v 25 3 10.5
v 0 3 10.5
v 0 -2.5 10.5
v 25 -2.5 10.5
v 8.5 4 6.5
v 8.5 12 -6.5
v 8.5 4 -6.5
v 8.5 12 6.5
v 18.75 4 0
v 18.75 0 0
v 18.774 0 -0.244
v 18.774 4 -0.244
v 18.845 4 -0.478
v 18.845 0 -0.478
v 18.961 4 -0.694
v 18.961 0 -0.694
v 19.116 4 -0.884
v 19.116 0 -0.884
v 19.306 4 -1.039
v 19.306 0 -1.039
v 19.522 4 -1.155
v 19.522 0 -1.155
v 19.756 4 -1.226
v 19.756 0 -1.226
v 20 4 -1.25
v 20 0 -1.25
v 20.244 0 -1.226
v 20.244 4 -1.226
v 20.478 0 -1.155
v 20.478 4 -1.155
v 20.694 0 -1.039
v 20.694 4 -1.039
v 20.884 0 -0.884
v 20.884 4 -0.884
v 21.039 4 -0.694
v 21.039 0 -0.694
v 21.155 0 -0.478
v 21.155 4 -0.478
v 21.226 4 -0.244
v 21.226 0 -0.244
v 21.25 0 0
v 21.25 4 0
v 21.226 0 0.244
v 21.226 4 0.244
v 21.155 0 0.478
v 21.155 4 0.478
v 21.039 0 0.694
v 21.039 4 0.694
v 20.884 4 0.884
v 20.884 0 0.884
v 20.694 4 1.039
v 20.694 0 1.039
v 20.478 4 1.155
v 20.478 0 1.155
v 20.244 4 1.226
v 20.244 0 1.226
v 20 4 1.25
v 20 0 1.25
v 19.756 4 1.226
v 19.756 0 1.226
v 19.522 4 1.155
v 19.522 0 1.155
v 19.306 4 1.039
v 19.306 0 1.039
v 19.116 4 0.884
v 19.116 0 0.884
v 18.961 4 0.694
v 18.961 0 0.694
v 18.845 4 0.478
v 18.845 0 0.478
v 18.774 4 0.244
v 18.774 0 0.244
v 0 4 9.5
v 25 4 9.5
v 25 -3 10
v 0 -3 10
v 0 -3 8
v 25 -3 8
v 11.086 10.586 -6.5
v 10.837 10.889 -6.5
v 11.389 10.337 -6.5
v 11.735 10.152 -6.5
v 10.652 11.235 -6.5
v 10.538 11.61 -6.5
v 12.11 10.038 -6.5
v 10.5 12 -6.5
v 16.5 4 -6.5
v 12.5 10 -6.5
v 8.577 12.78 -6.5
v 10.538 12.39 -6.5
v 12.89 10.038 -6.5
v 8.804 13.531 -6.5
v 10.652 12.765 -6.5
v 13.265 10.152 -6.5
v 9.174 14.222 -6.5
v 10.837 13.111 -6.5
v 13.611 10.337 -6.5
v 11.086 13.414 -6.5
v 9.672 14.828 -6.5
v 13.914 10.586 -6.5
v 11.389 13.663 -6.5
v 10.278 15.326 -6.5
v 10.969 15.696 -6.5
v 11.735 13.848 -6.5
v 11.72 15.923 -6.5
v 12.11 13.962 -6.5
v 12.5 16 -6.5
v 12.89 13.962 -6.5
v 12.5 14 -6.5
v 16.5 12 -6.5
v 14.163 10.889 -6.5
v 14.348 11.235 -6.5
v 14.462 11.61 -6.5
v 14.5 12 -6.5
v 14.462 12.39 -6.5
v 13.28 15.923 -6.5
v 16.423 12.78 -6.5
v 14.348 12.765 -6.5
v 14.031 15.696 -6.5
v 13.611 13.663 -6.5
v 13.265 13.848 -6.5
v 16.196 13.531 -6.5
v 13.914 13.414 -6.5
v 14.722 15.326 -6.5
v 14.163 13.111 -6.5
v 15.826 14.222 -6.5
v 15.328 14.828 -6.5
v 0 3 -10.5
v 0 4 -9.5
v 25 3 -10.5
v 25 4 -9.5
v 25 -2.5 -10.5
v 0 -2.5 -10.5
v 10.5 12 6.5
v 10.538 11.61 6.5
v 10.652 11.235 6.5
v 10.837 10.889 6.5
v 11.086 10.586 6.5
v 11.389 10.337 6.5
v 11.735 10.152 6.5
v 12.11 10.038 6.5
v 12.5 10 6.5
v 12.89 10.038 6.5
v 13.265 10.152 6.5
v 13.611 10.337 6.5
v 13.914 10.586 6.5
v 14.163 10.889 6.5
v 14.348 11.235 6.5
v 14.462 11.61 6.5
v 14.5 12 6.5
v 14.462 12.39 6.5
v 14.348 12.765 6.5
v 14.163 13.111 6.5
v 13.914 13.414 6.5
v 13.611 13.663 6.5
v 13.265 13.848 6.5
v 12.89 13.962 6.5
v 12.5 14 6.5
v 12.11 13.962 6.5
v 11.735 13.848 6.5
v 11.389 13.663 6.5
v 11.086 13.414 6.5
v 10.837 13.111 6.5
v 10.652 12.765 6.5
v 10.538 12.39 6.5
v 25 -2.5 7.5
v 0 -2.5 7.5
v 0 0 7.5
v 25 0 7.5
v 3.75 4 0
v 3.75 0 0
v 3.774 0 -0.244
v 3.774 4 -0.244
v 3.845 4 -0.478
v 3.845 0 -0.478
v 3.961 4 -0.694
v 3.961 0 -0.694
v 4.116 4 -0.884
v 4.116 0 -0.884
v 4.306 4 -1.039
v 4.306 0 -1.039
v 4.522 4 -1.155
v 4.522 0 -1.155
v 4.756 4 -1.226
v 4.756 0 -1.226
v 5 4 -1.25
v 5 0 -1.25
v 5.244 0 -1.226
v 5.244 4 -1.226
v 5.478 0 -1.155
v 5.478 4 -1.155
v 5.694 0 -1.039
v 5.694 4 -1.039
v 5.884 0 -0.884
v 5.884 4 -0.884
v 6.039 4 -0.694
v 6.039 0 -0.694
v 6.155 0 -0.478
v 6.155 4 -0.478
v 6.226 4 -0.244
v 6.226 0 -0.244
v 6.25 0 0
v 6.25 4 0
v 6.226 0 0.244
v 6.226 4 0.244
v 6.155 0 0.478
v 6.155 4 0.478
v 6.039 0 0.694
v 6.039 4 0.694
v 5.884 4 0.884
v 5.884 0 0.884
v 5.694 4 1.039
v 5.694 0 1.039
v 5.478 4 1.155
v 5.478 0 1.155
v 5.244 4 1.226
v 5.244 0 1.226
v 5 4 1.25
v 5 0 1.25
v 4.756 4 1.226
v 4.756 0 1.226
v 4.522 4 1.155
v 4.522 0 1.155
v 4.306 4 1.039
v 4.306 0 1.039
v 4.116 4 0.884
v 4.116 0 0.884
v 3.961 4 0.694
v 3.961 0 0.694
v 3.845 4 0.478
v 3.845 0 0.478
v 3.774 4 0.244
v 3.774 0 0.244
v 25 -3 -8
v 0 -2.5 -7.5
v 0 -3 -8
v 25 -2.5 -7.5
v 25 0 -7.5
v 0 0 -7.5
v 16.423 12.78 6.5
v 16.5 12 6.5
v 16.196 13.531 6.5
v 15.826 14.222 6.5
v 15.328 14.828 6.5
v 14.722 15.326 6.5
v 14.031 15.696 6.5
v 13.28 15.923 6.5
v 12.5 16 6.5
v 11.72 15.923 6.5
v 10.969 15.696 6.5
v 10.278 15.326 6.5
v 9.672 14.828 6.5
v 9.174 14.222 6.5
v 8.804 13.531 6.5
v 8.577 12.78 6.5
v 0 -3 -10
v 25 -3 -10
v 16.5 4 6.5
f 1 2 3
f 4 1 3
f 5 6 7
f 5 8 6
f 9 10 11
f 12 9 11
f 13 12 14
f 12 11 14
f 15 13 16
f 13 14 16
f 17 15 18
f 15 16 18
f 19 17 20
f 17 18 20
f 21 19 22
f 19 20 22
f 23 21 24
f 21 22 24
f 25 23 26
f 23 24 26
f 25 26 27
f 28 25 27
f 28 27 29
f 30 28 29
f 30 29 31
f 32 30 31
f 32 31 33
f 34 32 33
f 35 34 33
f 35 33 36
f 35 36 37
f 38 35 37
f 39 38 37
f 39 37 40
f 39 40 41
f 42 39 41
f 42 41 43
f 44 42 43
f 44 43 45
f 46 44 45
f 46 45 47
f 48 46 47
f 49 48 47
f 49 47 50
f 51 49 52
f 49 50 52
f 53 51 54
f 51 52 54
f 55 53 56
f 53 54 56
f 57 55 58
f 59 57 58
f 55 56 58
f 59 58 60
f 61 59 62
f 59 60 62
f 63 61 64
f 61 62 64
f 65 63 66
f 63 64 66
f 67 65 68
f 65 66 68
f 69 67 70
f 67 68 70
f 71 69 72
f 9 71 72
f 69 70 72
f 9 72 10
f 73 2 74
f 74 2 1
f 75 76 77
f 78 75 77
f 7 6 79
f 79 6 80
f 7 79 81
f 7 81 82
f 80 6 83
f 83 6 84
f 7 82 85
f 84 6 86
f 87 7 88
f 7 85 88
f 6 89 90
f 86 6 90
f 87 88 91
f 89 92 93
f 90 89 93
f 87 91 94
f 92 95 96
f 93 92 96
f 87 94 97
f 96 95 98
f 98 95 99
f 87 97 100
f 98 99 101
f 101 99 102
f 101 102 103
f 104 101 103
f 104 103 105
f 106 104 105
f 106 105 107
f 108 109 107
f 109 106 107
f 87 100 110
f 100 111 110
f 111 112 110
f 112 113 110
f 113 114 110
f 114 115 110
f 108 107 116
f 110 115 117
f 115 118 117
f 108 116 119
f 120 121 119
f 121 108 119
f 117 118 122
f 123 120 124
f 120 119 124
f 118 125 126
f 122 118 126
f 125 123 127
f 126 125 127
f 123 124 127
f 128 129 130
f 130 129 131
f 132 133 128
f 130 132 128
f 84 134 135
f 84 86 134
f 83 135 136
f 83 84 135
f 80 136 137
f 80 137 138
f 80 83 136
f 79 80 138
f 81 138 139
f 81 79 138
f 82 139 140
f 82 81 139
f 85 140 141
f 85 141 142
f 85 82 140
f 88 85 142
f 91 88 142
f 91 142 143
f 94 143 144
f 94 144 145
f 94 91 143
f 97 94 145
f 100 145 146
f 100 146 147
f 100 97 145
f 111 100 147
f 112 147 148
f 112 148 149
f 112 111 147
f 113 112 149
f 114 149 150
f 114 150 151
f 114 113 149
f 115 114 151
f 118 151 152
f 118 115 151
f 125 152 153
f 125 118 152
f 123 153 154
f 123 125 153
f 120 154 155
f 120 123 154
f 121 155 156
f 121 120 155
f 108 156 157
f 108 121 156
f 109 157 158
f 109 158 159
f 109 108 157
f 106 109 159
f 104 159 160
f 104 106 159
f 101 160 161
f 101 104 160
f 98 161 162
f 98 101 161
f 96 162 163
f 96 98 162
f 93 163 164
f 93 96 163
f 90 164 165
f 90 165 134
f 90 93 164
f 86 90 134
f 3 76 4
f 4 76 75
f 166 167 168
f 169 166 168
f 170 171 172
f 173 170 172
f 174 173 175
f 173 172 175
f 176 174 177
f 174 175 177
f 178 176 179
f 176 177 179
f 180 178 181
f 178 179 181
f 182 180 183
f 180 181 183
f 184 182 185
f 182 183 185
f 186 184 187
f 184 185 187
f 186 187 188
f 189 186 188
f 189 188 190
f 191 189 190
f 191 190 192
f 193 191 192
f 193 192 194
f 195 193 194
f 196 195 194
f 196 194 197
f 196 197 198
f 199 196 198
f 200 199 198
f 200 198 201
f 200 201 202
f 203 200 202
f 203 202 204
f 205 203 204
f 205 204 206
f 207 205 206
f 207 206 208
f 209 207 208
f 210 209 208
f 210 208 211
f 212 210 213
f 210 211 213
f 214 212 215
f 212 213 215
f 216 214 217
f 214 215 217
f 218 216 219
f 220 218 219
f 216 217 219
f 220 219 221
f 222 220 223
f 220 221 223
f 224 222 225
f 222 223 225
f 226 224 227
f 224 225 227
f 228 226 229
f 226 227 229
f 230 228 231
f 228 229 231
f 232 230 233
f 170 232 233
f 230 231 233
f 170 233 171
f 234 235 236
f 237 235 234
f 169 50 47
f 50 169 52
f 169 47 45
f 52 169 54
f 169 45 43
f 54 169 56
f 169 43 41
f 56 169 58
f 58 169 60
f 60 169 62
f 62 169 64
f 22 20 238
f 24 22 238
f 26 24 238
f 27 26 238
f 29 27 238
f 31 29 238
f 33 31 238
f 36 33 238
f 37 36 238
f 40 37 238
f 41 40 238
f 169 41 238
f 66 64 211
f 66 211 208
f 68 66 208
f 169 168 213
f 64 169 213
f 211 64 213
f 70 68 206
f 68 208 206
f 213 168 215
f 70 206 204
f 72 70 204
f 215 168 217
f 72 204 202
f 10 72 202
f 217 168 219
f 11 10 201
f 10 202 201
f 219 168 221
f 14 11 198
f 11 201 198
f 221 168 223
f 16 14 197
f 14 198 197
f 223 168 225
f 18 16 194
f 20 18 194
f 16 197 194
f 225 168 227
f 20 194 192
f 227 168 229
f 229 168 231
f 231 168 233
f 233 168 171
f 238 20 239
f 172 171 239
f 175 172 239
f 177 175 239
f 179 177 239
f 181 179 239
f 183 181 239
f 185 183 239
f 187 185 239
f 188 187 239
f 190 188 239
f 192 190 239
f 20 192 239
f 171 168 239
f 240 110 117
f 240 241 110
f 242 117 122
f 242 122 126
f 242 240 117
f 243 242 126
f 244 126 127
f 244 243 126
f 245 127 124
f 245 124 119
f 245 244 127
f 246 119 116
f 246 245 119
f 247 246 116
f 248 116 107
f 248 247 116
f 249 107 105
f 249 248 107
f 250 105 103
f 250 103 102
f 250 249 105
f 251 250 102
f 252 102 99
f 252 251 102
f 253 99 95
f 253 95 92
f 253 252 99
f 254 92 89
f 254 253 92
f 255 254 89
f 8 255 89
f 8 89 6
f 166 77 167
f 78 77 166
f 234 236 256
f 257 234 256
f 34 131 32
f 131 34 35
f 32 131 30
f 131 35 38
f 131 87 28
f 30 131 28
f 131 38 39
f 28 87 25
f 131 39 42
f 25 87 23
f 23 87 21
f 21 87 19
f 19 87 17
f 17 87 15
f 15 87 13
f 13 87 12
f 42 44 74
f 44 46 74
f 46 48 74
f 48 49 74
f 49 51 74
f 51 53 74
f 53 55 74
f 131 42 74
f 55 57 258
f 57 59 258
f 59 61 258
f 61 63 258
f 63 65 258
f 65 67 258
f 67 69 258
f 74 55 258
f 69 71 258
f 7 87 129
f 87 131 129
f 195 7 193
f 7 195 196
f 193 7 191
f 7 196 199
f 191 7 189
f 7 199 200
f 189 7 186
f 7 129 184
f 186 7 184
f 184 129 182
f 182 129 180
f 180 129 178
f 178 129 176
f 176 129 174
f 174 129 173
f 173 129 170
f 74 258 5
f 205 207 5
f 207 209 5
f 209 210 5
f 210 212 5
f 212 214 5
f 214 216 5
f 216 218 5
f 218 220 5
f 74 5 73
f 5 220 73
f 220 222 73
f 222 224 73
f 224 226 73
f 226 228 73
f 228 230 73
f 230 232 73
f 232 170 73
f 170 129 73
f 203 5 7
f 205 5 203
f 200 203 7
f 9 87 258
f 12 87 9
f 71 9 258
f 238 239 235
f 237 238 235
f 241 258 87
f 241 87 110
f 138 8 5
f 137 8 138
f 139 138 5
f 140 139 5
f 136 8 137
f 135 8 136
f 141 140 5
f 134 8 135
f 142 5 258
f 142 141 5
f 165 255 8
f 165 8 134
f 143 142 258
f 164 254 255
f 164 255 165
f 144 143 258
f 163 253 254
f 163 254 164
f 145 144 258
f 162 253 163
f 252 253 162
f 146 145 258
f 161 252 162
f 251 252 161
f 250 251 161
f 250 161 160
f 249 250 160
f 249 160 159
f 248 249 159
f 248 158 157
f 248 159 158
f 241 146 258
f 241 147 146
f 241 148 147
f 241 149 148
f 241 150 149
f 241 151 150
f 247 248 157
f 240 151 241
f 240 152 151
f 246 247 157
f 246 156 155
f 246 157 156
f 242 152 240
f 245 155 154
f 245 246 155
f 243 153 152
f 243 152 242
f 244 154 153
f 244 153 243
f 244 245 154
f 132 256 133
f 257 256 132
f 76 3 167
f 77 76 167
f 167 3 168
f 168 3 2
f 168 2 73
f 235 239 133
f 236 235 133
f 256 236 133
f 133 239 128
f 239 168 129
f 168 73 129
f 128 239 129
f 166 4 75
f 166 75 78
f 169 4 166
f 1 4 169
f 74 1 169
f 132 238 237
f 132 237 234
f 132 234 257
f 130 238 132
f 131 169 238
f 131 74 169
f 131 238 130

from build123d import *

# Parameters (mm, degrees)
EXTRUDE_1_DEPTH    = 25
SKETCH_2_R         = 2
EXTRUDE_2_DEPTH    = 6.5
HOLE_WIZARD_M3_1_D = 2.5
CHAMFER_1_SIZE     = 1
CHAMFER_2_SIZE     = 0.5


with BuildPart() as part:
    # 草图1 → 凸台-拉伸1 (new body)
    with BuildSketch(Plane(origin=(0, 0, 0), x_dir=(0, 0, -1), z_dir=(1, 0, 0))):
        Polygon((-7.5, 0), (7.5, 0), (7.5, -3), (10.5, -3), (10.5, 4), (-10.5, 4), (-10.5, -3), (-7.5, -3), align=None)
    extrude(amount=EXTRUDE_1_DEPTH)

    # 草图2 → 凸台-拉伸2 (add, symmetric)
    with BuildSketch(Plane.XY):
        with BuildLine():
            Line((8.5, 12), (8.5, 4))
            Line((8.5, 4), (16.5, 4))
            Line((16.5, 4), (16.5, 12))
            ThreePointArc((16.5, 12), (12.5, 16), (8.5, 12))
        make_face()
        with Locations(Location((12.5, 12, 0), (0, 0, 180))):
            Circle(SKETCH_2_R, mode=Mode.SUBTRACT)
    extrude(amount=EXTRUDE_2_DEPTH, both=True)

    # M3 螺纹孔1 (through all)
    with Locations(Plane(origin=(0, 4, 0), x_dir=(1, 0, 0), z_dir=(0, 1, 0))):
        with Locations((5, 0), (20, 0)):
            Hole(HOLE_WIZARD_M3_1_D / 2)

    # 倒角1
    chamfer_1_edges = [part.edges().sort_by_distance(p)[0] for p in [
        (12.5, 4, 10.5),
        (12.5, 4, -10.5),
    ]]
    chamfer(chamfer_1_edges, length=CHAMFER_1_SIZE)

    # 倒角2
    chamfer_2_edges = [part.edges().sort_by_distance(p)[0] for p in [
        (12.5, -3, 7.5),
        (12.5, -3, 10.5),
        (12.5, -3, -10.5),
        (12.5, -3, -7.5),
    ]]
    chamfer(chamfer_2_edges, length=CHAMFER_2_SIZE)


solid = part.part
